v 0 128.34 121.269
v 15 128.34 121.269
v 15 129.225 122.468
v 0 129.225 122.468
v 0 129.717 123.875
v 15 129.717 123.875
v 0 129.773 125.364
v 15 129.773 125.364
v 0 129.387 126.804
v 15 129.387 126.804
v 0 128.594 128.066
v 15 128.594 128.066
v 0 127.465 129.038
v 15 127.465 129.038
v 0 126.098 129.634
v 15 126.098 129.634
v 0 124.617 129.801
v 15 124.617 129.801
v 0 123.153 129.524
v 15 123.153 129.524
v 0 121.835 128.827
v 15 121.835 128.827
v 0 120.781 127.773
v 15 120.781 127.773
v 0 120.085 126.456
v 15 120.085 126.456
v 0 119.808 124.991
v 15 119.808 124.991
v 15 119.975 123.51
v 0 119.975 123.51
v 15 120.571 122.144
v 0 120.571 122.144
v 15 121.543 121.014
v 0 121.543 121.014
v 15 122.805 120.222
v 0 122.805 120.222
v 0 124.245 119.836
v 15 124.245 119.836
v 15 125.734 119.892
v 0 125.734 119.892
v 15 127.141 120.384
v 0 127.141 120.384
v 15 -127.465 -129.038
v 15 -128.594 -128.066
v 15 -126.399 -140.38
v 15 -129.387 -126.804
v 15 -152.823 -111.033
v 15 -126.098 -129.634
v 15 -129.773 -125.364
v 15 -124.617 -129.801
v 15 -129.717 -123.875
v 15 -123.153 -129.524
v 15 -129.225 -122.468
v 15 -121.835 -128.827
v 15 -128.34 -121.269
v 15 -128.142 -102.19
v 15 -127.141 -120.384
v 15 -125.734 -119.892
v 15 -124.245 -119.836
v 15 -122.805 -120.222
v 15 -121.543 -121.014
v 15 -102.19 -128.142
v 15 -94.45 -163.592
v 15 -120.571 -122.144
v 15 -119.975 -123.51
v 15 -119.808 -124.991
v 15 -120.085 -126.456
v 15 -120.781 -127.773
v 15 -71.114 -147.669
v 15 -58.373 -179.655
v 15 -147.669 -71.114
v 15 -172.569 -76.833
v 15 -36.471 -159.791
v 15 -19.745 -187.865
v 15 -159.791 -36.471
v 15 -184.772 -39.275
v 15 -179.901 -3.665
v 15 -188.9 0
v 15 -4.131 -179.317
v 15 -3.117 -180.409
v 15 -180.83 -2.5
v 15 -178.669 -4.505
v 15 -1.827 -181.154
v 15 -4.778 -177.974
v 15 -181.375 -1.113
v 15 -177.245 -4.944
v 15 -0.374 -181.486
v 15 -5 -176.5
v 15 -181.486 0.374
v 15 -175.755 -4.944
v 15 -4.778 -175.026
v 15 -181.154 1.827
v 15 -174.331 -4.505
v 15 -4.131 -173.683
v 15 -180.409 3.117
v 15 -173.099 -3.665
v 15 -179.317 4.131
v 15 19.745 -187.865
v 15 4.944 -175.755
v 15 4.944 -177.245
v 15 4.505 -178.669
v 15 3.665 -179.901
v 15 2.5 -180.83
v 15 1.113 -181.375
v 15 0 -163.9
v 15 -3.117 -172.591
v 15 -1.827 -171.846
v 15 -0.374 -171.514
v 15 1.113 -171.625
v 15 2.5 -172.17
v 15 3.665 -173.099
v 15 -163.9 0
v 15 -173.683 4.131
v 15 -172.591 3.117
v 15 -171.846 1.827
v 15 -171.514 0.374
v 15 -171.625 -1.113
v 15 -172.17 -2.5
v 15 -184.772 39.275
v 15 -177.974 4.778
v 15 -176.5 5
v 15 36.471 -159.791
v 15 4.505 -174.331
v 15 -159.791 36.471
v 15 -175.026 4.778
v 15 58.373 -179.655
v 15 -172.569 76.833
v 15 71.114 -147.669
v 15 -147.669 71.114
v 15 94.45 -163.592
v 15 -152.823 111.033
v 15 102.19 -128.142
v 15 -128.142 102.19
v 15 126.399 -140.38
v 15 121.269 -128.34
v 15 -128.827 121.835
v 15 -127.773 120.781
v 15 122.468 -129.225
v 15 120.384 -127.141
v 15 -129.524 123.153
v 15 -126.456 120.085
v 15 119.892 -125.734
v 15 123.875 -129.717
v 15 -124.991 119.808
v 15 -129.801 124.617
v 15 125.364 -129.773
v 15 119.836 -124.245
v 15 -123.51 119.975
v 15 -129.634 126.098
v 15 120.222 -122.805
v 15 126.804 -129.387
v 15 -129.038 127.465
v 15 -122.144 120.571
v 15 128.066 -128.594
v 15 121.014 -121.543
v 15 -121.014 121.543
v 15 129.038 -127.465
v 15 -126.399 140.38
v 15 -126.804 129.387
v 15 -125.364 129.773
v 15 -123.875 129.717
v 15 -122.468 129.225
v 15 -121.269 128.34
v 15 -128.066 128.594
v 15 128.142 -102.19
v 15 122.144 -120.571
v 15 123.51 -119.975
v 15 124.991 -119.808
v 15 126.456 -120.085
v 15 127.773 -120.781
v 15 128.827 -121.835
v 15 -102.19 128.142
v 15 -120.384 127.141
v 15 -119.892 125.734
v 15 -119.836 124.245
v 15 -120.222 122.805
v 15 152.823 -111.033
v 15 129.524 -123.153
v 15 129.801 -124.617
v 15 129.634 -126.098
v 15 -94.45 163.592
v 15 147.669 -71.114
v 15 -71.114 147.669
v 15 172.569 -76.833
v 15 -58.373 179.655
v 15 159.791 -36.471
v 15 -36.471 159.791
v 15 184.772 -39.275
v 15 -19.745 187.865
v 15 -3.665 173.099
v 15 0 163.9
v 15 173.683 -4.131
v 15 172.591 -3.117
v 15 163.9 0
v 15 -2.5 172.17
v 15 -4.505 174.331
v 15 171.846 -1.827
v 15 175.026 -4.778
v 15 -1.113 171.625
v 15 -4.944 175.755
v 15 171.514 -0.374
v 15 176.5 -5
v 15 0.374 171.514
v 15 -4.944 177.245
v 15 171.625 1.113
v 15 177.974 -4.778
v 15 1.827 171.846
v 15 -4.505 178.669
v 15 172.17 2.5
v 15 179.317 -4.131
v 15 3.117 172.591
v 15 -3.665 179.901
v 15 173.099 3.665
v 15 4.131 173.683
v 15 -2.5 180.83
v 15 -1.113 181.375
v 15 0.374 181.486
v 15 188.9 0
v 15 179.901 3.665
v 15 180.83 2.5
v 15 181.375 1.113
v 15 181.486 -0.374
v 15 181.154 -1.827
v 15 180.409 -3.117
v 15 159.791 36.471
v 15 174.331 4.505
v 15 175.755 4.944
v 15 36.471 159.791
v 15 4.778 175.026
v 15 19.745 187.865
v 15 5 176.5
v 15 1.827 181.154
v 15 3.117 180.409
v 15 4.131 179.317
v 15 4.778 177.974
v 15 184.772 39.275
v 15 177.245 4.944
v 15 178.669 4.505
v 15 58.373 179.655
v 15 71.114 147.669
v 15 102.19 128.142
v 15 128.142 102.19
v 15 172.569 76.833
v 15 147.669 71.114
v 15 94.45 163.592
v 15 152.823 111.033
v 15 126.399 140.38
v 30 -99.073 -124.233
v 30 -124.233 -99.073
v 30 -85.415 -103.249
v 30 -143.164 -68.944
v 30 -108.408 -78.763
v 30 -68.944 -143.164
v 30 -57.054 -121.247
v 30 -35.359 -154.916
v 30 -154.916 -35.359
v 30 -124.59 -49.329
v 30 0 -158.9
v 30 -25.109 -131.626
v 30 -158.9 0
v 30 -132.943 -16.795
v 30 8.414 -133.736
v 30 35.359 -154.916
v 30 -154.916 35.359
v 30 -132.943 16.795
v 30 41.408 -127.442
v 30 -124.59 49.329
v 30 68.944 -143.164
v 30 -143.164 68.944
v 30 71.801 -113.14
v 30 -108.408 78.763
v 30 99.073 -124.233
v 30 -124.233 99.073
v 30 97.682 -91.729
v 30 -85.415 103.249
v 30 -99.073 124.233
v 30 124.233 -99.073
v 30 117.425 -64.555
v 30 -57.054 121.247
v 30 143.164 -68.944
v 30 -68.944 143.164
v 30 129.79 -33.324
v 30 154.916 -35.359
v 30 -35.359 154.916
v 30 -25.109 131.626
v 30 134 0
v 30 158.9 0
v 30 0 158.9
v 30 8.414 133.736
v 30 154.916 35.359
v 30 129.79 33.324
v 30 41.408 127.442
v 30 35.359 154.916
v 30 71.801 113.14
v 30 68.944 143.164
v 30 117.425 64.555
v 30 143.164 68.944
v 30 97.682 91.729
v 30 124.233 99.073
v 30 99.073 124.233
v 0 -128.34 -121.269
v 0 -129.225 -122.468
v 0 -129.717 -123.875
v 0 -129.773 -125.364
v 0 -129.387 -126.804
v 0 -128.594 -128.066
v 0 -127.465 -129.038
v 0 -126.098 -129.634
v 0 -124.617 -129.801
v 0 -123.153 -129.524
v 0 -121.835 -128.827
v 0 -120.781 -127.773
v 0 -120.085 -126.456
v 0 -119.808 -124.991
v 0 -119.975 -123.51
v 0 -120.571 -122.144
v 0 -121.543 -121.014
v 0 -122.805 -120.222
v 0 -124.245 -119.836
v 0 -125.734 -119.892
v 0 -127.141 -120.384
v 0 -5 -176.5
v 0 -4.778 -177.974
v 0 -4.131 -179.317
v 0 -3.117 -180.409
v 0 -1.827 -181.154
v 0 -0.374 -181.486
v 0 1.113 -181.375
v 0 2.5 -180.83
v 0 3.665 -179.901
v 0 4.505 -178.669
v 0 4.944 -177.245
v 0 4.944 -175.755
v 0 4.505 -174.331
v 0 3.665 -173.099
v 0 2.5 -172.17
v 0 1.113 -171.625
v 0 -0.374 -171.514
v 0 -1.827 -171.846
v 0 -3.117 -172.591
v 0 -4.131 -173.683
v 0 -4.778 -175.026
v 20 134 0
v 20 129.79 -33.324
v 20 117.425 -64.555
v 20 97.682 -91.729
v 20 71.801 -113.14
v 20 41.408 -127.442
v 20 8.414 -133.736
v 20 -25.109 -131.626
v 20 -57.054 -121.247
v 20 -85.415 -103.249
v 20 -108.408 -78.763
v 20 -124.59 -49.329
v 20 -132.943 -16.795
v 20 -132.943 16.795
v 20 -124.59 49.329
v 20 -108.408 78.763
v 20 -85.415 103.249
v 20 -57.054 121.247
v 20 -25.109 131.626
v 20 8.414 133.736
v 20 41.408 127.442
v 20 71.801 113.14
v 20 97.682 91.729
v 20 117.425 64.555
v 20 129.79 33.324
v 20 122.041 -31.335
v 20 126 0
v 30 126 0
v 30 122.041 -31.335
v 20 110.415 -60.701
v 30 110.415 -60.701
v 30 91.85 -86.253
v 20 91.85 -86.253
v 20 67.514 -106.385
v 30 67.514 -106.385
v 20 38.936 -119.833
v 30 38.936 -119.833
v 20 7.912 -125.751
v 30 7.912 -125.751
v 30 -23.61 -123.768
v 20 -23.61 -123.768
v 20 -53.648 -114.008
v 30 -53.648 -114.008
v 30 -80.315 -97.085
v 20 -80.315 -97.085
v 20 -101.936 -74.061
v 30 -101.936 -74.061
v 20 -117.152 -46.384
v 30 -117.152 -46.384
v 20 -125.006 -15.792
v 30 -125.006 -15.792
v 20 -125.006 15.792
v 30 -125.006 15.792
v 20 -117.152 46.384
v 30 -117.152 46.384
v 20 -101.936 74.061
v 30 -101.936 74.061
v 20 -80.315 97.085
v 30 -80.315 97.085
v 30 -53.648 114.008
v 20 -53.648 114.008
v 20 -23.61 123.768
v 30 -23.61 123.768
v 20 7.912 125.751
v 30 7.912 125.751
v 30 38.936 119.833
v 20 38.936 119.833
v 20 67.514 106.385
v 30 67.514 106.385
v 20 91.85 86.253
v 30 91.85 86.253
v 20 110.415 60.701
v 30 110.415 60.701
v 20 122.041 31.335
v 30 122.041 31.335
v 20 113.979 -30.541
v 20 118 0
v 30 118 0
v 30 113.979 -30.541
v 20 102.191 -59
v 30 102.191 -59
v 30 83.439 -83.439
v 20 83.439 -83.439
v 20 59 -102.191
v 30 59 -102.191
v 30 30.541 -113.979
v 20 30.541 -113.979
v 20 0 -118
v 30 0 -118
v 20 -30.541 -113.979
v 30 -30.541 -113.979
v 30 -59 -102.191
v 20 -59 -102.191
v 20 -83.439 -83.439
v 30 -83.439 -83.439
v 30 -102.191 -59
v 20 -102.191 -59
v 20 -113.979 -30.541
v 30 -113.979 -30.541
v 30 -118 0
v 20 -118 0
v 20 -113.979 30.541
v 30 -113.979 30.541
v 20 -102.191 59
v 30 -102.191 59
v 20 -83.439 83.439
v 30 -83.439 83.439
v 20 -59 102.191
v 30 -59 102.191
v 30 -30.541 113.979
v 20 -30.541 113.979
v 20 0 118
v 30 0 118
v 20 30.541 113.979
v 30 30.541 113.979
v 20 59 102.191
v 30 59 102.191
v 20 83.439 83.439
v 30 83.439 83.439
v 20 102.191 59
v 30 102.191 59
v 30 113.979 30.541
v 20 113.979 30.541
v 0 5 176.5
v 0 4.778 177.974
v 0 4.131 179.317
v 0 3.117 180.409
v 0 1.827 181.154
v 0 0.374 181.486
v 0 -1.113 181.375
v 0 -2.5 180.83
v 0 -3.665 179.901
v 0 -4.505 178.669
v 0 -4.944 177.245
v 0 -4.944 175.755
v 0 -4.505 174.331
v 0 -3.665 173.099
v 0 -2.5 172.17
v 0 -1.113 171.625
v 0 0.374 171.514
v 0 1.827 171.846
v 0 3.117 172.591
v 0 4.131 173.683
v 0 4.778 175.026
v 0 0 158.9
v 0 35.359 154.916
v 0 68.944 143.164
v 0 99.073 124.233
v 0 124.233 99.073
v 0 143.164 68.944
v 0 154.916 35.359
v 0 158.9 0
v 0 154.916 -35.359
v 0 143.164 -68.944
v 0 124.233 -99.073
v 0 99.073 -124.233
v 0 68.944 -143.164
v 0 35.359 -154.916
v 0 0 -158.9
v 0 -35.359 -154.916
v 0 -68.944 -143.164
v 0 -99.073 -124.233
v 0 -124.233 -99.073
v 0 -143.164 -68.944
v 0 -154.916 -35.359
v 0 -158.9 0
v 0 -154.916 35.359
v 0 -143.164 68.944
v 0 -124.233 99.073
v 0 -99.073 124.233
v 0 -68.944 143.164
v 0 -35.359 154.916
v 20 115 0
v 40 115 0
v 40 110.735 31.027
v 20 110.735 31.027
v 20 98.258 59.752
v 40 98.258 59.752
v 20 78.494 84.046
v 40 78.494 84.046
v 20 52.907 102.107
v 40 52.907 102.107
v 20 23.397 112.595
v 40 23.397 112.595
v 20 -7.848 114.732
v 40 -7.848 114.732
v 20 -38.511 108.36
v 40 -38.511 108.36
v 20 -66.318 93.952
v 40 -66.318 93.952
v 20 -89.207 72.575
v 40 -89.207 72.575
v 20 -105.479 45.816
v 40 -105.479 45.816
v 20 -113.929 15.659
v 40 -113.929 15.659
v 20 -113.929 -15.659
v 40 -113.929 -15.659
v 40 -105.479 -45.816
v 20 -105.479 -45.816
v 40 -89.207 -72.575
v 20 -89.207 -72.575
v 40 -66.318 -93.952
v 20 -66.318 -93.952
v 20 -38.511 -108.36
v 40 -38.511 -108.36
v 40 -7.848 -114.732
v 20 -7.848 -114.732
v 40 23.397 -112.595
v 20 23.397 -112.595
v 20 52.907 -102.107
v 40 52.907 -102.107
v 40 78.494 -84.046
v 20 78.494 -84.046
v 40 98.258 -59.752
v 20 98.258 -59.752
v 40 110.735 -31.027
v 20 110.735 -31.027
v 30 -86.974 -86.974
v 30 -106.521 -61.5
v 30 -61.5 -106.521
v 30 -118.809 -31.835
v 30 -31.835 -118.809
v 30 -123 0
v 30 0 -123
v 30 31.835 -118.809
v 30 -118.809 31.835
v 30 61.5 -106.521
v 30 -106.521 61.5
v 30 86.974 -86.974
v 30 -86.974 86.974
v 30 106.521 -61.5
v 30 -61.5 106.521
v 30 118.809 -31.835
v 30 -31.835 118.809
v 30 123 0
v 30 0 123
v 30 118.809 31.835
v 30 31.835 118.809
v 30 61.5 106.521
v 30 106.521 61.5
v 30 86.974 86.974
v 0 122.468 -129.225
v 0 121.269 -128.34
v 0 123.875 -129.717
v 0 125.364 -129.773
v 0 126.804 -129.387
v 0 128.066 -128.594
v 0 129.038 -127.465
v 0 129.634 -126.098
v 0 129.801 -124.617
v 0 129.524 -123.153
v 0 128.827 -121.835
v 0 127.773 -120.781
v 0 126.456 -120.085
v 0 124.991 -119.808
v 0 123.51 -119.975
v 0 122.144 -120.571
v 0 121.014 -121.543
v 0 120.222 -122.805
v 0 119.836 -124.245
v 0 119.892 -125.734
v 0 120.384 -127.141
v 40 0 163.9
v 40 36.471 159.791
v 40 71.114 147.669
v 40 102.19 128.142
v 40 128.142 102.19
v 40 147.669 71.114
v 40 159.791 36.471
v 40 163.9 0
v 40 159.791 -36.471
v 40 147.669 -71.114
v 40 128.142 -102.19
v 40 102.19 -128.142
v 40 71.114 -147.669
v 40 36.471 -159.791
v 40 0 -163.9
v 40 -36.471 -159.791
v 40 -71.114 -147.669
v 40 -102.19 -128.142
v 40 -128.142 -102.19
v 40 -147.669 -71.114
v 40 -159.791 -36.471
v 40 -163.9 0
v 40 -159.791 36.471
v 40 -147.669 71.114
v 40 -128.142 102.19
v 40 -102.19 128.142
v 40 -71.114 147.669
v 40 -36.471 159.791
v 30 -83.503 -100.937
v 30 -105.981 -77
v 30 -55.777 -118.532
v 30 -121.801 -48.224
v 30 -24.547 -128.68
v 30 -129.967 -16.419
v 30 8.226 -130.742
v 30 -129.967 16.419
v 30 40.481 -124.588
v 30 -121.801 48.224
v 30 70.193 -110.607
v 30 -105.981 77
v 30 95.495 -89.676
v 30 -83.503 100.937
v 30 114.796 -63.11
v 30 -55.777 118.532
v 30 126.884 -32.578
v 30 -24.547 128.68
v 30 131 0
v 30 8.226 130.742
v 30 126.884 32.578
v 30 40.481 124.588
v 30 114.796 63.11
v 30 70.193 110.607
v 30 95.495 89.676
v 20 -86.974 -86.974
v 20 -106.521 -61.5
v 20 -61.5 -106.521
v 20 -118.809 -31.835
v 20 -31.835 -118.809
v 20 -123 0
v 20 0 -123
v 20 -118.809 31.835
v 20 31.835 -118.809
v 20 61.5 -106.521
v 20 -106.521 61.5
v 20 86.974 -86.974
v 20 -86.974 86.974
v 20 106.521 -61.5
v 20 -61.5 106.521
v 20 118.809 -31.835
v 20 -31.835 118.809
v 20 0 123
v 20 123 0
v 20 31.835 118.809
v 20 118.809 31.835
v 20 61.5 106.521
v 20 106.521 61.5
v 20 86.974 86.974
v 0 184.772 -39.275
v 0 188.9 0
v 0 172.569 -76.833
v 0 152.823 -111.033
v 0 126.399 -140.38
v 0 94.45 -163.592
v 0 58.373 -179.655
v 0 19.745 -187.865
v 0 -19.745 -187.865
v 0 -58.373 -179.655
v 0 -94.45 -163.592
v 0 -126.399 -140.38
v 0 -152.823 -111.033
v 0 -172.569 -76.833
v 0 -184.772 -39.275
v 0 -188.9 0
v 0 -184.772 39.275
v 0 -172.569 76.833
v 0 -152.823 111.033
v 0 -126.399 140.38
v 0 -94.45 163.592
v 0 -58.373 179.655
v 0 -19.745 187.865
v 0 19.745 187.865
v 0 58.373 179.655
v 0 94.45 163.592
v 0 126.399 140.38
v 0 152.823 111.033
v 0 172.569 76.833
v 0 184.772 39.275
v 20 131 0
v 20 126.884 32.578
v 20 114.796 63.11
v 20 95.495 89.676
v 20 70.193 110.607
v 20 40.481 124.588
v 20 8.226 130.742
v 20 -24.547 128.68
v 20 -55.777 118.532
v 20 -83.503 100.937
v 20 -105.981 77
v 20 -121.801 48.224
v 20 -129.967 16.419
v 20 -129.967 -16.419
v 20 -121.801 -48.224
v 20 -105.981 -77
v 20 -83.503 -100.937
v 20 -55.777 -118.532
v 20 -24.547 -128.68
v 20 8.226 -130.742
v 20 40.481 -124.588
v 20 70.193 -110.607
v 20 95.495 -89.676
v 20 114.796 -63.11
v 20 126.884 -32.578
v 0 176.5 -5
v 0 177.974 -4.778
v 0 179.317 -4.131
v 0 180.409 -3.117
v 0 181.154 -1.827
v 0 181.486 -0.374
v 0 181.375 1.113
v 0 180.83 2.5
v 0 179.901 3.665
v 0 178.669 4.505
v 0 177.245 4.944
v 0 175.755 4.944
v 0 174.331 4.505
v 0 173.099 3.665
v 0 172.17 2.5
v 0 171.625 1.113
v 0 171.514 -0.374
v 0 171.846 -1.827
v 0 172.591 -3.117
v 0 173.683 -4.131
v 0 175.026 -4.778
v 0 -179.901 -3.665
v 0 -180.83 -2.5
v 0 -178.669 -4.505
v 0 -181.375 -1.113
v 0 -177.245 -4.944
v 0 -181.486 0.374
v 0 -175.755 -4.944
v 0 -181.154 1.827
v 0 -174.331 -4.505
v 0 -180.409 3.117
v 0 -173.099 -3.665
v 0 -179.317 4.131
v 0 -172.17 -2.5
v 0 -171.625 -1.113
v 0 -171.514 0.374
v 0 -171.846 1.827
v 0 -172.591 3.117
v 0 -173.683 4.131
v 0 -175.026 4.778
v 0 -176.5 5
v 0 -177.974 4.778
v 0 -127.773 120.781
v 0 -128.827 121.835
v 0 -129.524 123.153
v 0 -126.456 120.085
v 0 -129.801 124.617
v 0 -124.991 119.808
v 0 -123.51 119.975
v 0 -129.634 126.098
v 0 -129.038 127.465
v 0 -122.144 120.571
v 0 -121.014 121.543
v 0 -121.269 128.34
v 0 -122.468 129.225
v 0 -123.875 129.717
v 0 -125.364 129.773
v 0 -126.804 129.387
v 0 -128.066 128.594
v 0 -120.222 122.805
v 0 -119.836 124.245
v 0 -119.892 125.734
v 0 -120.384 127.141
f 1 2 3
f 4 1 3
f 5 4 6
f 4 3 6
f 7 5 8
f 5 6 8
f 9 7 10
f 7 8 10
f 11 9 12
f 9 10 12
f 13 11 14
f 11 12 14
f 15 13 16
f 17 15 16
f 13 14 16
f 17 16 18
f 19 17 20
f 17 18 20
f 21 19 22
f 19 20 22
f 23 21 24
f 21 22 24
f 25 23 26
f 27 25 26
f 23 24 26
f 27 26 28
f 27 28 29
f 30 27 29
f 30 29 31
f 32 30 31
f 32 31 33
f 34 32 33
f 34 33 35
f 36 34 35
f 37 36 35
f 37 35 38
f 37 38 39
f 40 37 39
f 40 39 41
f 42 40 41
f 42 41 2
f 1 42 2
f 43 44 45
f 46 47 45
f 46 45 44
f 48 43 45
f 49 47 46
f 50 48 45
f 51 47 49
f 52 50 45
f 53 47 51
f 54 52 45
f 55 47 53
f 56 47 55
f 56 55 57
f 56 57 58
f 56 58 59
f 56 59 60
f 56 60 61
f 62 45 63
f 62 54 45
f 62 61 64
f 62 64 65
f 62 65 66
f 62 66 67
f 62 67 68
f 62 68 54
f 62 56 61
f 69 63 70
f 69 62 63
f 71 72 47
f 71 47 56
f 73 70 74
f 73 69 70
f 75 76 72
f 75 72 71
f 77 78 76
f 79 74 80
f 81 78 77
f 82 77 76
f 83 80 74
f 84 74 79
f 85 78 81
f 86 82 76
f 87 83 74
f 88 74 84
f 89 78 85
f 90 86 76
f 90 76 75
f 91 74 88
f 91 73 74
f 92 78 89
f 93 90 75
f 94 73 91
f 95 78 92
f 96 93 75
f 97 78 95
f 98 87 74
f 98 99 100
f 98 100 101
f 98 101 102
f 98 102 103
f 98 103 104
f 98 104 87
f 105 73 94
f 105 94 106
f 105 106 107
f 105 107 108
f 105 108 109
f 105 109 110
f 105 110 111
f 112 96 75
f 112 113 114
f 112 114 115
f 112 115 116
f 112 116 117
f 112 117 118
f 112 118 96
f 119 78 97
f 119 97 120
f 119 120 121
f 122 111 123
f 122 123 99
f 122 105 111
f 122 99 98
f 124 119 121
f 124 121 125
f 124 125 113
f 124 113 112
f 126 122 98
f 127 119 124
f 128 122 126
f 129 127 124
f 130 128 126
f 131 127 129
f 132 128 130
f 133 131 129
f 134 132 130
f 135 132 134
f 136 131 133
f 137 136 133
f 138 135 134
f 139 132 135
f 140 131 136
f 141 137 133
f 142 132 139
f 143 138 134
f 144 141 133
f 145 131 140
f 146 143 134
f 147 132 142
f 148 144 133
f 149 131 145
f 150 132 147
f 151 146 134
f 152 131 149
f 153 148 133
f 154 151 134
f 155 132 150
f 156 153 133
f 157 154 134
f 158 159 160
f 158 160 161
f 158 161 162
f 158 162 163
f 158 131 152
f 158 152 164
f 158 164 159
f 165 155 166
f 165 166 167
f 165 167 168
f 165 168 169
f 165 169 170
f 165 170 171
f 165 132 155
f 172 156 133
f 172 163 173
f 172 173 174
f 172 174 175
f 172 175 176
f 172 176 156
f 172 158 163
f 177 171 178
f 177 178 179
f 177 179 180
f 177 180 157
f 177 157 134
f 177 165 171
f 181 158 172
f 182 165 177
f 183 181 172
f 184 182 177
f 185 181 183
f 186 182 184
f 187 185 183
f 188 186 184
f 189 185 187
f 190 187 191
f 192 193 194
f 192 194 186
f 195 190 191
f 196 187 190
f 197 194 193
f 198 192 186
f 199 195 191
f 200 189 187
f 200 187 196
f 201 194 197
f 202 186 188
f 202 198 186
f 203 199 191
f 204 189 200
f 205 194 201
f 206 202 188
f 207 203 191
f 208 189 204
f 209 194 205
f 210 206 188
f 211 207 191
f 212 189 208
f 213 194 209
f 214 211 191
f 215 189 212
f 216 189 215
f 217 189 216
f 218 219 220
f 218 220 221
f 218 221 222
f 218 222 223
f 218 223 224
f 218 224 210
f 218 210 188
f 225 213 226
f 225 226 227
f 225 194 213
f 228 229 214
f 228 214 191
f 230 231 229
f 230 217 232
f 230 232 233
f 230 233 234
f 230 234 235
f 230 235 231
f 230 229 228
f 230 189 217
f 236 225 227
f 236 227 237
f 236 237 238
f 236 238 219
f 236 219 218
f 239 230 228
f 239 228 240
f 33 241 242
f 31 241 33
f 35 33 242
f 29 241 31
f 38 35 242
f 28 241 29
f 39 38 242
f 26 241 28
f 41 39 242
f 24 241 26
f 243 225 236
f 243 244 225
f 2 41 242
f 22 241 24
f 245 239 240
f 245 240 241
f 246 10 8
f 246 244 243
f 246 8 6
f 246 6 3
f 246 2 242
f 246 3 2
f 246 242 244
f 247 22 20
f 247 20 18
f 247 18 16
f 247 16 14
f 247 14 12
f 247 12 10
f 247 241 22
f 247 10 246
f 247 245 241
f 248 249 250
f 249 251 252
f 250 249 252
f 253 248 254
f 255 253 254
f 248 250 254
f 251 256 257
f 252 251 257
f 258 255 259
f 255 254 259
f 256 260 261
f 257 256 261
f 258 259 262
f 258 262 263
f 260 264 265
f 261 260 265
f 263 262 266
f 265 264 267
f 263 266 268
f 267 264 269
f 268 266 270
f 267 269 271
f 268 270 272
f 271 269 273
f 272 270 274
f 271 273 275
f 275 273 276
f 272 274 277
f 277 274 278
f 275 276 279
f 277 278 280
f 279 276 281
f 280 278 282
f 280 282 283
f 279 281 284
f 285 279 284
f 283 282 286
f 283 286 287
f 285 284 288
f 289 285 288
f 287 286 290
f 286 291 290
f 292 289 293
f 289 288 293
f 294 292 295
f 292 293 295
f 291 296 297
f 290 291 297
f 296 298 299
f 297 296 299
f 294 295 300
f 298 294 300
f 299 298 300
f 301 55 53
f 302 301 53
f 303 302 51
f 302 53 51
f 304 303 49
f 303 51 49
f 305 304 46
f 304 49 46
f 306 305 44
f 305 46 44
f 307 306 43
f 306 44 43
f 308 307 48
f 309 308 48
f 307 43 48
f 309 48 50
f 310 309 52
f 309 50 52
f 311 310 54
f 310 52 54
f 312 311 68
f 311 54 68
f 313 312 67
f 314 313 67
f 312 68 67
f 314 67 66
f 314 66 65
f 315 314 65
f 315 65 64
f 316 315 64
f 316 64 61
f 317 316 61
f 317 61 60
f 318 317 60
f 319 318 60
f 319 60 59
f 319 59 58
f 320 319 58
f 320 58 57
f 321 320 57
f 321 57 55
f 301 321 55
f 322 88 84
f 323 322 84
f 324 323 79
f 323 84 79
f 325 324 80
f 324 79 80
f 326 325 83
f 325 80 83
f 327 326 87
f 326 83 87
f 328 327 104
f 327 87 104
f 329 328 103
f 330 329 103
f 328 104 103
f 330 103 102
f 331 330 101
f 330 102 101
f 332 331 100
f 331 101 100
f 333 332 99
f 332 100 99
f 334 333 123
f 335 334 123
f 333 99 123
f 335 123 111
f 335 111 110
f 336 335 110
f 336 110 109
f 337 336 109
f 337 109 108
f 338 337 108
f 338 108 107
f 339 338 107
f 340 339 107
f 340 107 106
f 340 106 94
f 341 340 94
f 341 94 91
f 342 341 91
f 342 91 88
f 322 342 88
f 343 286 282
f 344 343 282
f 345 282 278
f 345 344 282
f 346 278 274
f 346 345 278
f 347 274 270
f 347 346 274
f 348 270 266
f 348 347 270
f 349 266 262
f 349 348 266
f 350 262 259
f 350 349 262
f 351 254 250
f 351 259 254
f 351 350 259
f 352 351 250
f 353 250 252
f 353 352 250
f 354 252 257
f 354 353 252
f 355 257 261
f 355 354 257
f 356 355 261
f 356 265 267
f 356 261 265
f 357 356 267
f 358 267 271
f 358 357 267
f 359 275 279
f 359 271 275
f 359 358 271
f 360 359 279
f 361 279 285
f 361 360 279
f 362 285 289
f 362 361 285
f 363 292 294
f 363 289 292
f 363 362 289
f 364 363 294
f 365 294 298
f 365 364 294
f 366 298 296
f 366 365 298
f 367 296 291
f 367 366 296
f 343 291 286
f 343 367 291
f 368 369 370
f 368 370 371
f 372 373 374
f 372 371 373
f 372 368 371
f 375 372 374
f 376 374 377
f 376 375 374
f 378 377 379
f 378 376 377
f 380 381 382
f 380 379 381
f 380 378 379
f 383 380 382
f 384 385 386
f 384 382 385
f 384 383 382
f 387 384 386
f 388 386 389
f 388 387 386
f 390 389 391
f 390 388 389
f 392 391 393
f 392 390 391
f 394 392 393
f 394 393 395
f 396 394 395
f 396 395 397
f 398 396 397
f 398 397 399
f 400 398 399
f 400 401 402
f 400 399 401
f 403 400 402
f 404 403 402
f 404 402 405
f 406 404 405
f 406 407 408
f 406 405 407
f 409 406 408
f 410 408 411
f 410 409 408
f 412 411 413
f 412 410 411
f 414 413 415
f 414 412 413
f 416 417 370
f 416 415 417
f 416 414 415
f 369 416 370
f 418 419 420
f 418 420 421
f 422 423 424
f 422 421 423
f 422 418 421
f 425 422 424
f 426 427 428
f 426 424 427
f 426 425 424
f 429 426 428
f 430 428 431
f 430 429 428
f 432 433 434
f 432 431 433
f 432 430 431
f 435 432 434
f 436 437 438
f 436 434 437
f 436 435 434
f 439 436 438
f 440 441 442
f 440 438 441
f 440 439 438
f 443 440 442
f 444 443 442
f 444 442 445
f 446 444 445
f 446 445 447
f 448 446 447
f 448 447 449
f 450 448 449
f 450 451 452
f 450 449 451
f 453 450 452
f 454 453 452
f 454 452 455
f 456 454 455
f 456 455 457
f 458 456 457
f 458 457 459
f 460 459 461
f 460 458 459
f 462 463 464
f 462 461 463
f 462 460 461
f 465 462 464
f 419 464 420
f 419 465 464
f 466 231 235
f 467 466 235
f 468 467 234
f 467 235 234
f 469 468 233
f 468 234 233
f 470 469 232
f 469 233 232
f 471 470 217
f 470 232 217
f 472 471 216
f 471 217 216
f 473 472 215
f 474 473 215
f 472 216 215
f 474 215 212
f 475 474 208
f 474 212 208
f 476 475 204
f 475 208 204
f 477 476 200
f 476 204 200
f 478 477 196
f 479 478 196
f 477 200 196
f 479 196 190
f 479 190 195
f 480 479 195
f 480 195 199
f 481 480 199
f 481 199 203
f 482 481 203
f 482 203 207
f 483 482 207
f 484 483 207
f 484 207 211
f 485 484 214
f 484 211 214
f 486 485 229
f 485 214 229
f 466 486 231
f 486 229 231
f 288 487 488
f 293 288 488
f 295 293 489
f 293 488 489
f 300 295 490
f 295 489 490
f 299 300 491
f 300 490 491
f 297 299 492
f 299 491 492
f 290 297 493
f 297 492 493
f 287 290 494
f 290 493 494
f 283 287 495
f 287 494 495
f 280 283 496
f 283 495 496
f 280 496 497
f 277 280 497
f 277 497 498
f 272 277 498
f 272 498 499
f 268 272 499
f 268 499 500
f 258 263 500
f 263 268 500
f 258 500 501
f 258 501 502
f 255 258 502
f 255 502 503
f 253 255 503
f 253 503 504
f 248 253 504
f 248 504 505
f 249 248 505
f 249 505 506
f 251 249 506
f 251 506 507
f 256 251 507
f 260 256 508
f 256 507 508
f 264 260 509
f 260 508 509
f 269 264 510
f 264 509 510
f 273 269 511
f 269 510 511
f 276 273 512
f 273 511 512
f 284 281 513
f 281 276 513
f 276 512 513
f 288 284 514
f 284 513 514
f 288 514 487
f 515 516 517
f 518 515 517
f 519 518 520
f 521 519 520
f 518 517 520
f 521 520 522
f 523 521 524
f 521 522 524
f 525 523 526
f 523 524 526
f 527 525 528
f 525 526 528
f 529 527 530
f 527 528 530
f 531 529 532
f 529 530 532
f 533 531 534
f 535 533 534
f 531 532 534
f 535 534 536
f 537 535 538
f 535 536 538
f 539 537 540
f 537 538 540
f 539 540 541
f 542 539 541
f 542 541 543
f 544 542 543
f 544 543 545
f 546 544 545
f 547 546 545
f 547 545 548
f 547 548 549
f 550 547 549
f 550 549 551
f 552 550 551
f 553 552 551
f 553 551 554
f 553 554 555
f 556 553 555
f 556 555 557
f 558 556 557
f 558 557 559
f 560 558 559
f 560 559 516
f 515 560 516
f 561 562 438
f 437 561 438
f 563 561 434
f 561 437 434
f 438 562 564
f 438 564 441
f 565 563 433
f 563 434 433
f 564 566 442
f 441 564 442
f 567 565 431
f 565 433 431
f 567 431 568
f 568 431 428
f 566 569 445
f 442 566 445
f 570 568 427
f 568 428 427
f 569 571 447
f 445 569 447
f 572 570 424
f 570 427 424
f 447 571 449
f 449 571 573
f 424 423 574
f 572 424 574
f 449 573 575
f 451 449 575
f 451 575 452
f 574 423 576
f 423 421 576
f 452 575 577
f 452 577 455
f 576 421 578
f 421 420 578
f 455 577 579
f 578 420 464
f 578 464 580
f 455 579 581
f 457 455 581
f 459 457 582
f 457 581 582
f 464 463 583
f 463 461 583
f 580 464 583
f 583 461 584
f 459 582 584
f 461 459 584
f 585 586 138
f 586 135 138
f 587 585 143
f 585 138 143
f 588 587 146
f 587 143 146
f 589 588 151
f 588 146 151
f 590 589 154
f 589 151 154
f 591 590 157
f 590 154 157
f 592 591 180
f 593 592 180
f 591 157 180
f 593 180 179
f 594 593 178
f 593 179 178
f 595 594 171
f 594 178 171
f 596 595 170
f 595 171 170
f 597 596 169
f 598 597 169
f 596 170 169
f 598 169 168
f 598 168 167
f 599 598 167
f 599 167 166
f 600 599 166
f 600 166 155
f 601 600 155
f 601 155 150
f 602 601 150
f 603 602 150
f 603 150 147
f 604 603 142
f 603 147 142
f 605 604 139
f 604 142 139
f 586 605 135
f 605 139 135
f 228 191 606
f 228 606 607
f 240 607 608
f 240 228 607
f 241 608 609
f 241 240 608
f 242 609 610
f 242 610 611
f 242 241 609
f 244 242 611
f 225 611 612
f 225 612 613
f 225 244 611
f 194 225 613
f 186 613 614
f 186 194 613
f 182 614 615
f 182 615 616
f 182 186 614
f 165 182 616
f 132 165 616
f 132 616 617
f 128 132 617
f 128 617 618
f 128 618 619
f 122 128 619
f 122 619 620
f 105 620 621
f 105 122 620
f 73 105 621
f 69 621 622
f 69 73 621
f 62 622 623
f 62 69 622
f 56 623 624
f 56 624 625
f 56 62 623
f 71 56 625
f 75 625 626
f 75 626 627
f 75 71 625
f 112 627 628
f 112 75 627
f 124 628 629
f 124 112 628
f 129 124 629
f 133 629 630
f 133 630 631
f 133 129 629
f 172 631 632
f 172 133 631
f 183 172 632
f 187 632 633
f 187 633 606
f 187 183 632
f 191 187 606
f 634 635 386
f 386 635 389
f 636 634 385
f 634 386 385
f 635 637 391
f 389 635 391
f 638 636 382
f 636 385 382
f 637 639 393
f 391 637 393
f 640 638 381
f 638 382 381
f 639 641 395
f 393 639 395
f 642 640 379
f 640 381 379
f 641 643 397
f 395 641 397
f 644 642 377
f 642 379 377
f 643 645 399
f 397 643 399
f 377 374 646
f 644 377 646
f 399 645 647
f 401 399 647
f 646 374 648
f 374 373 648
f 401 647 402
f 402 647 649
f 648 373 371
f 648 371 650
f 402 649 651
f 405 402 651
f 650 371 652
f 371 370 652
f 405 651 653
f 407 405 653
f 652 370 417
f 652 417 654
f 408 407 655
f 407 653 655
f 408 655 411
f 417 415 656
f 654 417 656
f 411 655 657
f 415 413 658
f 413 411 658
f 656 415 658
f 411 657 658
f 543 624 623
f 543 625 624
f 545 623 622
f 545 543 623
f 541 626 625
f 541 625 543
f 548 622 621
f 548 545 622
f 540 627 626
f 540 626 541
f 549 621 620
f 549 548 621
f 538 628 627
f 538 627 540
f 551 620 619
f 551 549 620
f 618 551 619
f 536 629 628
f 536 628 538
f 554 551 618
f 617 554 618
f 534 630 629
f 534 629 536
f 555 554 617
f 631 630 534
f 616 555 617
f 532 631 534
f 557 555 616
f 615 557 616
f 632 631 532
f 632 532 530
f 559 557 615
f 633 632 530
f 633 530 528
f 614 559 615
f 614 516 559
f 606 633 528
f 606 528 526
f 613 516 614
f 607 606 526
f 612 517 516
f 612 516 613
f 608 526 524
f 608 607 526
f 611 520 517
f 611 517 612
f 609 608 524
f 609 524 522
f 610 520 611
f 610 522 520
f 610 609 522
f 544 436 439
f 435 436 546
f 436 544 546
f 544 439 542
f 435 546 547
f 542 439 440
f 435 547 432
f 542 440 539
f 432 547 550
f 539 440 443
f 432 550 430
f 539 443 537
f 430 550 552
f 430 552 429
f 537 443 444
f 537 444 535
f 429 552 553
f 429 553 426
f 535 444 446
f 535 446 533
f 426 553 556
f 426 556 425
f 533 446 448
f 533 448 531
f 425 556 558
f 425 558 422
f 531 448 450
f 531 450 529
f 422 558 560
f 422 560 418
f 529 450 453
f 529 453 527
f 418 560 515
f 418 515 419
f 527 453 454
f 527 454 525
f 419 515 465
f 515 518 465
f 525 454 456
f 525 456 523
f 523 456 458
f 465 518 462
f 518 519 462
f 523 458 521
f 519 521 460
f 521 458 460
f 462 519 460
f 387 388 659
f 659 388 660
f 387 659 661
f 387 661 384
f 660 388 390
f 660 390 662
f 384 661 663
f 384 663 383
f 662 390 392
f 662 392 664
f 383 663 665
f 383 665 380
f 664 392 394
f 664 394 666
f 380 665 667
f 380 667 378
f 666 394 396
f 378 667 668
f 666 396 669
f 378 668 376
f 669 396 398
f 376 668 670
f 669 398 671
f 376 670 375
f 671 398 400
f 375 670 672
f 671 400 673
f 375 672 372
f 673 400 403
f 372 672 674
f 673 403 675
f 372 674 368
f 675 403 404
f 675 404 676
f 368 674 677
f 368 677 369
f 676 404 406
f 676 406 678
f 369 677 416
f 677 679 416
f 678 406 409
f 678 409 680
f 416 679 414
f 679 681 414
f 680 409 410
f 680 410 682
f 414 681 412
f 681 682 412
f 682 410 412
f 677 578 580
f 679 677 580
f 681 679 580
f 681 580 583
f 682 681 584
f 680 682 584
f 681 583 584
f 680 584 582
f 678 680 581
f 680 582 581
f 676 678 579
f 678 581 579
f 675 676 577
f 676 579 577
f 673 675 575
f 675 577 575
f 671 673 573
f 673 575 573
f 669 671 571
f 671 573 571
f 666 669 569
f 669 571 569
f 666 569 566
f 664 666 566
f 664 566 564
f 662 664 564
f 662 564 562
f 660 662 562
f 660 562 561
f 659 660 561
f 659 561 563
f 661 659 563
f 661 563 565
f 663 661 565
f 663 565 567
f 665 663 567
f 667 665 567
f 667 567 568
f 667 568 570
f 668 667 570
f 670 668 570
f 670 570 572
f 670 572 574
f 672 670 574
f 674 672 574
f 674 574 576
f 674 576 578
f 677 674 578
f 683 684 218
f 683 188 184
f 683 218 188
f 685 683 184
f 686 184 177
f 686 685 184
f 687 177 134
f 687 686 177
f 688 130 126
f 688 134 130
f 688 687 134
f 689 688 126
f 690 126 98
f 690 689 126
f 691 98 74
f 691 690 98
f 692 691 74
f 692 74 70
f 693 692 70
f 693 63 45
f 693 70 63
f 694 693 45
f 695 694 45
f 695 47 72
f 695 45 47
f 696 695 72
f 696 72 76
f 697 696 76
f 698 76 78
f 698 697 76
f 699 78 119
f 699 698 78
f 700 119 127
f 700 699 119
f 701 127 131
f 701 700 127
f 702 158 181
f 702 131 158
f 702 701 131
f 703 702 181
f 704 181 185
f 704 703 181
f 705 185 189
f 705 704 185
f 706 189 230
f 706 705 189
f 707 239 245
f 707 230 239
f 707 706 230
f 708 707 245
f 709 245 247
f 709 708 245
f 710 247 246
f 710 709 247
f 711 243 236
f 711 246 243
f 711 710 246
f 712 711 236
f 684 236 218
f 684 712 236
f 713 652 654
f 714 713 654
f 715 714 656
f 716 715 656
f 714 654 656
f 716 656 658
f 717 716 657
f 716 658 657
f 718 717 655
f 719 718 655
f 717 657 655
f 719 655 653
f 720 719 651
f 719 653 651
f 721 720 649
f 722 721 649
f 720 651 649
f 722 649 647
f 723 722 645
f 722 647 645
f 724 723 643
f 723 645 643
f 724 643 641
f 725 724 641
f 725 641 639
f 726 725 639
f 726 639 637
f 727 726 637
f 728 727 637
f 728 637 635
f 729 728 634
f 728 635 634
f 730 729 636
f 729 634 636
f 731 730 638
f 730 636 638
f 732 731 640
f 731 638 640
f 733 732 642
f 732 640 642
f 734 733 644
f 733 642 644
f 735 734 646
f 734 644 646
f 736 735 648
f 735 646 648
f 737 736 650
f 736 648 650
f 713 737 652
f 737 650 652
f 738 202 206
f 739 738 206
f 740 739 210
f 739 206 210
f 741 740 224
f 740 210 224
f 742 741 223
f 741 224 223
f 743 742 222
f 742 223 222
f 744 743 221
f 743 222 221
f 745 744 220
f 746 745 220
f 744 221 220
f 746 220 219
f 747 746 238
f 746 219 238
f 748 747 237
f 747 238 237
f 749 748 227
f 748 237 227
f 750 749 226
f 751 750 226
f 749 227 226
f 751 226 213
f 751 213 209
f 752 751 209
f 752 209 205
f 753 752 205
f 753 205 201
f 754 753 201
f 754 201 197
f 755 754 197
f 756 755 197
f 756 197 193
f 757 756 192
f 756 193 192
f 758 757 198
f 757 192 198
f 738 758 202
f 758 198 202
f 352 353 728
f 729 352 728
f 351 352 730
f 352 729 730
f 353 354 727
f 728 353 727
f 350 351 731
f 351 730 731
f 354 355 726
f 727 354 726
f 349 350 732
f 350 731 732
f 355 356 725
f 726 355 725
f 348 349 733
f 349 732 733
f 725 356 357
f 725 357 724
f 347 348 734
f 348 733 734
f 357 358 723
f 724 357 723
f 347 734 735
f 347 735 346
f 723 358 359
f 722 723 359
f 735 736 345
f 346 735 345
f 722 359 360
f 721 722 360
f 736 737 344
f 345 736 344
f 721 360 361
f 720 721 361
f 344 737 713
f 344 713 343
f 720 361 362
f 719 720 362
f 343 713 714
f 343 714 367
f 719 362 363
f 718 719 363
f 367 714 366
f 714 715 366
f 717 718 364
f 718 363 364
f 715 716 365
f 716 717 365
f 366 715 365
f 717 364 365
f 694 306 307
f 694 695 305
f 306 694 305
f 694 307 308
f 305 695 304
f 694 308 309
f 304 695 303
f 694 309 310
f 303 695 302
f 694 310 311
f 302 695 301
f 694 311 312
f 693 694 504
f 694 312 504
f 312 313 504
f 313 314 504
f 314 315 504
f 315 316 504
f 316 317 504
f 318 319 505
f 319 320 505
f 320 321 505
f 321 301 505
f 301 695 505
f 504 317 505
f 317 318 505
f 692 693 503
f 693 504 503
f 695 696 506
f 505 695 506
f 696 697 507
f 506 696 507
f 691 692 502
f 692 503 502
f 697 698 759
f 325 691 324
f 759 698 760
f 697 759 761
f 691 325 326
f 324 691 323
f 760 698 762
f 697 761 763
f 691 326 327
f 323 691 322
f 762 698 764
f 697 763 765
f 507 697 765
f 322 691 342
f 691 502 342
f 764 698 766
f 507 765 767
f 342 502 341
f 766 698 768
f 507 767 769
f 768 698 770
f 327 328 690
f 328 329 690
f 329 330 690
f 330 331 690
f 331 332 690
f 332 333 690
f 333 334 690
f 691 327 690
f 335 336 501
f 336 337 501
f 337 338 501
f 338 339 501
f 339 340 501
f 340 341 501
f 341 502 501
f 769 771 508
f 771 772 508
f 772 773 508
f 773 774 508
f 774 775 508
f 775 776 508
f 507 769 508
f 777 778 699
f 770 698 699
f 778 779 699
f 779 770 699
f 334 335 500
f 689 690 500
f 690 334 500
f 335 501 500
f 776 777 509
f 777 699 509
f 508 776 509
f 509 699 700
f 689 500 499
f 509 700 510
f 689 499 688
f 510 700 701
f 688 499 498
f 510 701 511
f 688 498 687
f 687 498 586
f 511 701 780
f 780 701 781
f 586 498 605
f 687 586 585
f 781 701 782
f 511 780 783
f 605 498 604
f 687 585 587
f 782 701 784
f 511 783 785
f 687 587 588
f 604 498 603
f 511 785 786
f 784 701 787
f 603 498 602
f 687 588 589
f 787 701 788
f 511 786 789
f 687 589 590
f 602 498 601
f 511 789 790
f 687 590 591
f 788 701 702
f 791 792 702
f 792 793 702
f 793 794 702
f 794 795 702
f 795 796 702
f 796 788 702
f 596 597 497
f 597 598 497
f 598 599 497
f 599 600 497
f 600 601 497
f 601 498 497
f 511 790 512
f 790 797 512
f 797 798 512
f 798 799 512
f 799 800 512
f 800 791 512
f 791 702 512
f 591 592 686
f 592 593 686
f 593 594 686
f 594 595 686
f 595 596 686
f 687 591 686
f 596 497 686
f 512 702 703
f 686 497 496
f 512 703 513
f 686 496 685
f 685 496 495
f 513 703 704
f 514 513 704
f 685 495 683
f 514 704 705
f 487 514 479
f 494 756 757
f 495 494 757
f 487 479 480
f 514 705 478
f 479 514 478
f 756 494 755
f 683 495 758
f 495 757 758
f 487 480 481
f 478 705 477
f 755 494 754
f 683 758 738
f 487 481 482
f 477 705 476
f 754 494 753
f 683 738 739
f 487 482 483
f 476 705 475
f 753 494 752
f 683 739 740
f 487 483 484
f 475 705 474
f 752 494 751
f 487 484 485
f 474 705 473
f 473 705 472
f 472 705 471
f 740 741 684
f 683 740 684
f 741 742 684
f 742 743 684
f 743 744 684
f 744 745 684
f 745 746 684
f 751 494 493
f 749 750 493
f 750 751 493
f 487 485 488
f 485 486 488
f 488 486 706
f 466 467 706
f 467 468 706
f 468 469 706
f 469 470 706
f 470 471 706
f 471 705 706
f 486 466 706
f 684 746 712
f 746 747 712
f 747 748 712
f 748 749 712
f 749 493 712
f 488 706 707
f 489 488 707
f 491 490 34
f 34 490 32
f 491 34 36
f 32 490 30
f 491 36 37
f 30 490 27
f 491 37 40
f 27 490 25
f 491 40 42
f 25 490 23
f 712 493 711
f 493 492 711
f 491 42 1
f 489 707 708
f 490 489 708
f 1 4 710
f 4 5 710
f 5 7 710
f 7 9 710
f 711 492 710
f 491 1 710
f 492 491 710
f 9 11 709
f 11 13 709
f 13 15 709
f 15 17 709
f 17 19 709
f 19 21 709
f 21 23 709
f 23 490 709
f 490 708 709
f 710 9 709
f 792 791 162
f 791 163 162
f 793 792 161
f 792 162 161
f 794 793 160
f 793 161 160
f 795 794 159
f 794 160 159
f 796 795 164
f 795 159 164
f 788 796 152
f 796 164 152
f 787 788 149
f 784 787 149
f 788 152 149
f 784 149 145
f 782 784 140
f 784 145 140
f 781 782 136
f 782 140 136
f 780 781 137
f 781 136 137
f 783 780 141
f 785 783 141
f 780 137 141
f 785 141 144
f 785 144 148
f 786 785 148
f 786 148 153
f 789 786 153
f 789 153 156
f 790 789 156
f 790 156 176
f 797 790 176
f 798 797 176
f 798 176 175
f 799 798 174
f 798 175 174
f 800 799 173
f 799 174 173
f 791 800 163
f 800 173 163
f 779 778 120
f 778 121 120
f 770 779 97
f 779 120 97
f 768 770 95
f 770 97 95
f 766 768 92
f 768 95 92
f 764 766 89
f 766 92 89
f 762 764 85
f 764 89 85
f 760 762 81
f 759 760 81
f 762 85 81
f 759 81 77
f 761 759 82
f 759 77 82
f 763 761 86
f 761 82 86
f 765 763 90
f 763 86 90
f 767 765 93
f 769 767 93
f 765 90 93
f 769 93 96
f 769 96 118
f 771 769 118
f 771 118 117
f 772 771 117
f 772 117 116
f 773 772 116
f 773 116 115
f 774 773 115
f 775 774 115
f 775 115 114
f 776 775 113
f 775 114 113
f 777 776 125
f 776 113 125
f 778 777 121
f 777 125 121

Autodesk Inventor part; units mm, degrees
ref_plane "YZ Plane" through (0, 0, 0) normal (1, 0, 0) x (0, 1, 0)
ref_plane "XZ Plane" through (0, 0, 0) normal (0, 1, 0) x (-1, 0, 0)
ref_plane "XY Plane" through (0, 0, 0) normal (0, 0, 1) x (1, 0, 0)
sketch "Sketch1" plane through (0, 0, 0) normal (1, 0, 0) x (0, 1, 0)
  circle A0 centre (0, 0) radius 188.9
  circle A1 centre (0, 0) radius 163.9
  dimension "d0" = 377.8
  dimension "d2" = 327.8
extrude "Extrusion1" add sketch "Sketch1" along normal blind 15
sketch "Sketch2" plane through (15, 0, 0) normal (1, 0, 0) x (0, 0, -1)
  circle A0 centre (0, 0) radius 176.5
  circle A1 centre (0, 176.5) radius 5
  dimension "d5" = 353
  dimension "d6" = 10
extrude "Extrusion2" cut sketch "Sketch2" against normal through all contours A1 A0 | A0 A1 picked at (0.1991, 174.84) picked at (0.1901, 178.1505)
pattern_circular "Circular Pattern1" count 8 over 360 about axis through (0, 0, 0) along (1, 0, 0) of "Extrusion2"
sketch "Sketch3" plane through (0, 0, 0) normal (-1, 0, 0) x (0, 0, 1)
  circle A0 centre (0, 0) radius 163.9
  circle A1 centre (0, 0) radius 158.9
  dimension "d12" = 317.8
extrude "Extrusion3" add sketch "Sketch3" against normal blind 40
sketch "Sketch4" plane through (0, 0, 0) normal (0, 0, 1) x (1, 0, 0)
  line L0 (40, 158.9) -> (40, -158.9) projected
  line L1 (40, -163.9) -> (40, 163.9) projected
  line L2 (30, 153.9) -> (30, 158.9)
  line L3 (30, 158.9) -> (40, 158.9)
  line L4 (40, 158.9) -> (40, 153.9)
  line L5 (30, 153.9) -> (30, 134)
  line L6 (40, 134) -> (40, 153.9)
  line L7 (-8, 0) -> (48, 0) projected
  line L8 (40, 158.9) -> (40, 134)
  line L9 (30, 134) -> (20, 134)
  line L10 (20, 134) -> (20, 131)
  line L11 (20, 131) -> (30, 131)
  line L12 (30, 131) -> (30, 126)
  line L13 (30, 126) -> (20, 126)
  line L14 (20, 126) -> (20, 123)
  line L15 (20, 123) -> (30, 123)
  line L16 (30, 123) -> (30, 118)
  line L17 (30, 118) -> (20, 118)
  line L18 (20, 118) -> (20, 115)
  line L19 (20, 115) -> (40, 115)
  line L20 (40, 115) -> (40, 134)
  point P0 (0, 0)
revolve "Revolution1" add sketch "Sketch4" angle 360 about axis through (-10, 0, 0) along (1, 0, 0)
thread "Thread1" size "M10x1.5" class "6H" standard "ANSI Metric M Profile" full length
thread "Thread2" size "M10x1.5" class "6H" standard "ANSI Metric M Profile" full length
thread "Thread3" size "M10x1.5" class "6H" standard "ANSI Metric M Profile" full length
thread "Thread4" size "M10x1.5" class "6H" standard "ANSI Metric M Profile" full length
thread "Thread5" size "M10x1.5" class "6H" standard "ANSI Metric M Profile" full length
thread "Thread6" size "M10x1.5" class "6H" standard "ANSI Metric M Profile" full length
thread "Thread7" size "M10x1.5" class "6H" standard "ANSI Metric M Profile" full length
thread "Thread8" size "M10x1.5" class "6H" standard "ANSI Metric M Profile" full length
properties part number "lavyrintosecondchance"
